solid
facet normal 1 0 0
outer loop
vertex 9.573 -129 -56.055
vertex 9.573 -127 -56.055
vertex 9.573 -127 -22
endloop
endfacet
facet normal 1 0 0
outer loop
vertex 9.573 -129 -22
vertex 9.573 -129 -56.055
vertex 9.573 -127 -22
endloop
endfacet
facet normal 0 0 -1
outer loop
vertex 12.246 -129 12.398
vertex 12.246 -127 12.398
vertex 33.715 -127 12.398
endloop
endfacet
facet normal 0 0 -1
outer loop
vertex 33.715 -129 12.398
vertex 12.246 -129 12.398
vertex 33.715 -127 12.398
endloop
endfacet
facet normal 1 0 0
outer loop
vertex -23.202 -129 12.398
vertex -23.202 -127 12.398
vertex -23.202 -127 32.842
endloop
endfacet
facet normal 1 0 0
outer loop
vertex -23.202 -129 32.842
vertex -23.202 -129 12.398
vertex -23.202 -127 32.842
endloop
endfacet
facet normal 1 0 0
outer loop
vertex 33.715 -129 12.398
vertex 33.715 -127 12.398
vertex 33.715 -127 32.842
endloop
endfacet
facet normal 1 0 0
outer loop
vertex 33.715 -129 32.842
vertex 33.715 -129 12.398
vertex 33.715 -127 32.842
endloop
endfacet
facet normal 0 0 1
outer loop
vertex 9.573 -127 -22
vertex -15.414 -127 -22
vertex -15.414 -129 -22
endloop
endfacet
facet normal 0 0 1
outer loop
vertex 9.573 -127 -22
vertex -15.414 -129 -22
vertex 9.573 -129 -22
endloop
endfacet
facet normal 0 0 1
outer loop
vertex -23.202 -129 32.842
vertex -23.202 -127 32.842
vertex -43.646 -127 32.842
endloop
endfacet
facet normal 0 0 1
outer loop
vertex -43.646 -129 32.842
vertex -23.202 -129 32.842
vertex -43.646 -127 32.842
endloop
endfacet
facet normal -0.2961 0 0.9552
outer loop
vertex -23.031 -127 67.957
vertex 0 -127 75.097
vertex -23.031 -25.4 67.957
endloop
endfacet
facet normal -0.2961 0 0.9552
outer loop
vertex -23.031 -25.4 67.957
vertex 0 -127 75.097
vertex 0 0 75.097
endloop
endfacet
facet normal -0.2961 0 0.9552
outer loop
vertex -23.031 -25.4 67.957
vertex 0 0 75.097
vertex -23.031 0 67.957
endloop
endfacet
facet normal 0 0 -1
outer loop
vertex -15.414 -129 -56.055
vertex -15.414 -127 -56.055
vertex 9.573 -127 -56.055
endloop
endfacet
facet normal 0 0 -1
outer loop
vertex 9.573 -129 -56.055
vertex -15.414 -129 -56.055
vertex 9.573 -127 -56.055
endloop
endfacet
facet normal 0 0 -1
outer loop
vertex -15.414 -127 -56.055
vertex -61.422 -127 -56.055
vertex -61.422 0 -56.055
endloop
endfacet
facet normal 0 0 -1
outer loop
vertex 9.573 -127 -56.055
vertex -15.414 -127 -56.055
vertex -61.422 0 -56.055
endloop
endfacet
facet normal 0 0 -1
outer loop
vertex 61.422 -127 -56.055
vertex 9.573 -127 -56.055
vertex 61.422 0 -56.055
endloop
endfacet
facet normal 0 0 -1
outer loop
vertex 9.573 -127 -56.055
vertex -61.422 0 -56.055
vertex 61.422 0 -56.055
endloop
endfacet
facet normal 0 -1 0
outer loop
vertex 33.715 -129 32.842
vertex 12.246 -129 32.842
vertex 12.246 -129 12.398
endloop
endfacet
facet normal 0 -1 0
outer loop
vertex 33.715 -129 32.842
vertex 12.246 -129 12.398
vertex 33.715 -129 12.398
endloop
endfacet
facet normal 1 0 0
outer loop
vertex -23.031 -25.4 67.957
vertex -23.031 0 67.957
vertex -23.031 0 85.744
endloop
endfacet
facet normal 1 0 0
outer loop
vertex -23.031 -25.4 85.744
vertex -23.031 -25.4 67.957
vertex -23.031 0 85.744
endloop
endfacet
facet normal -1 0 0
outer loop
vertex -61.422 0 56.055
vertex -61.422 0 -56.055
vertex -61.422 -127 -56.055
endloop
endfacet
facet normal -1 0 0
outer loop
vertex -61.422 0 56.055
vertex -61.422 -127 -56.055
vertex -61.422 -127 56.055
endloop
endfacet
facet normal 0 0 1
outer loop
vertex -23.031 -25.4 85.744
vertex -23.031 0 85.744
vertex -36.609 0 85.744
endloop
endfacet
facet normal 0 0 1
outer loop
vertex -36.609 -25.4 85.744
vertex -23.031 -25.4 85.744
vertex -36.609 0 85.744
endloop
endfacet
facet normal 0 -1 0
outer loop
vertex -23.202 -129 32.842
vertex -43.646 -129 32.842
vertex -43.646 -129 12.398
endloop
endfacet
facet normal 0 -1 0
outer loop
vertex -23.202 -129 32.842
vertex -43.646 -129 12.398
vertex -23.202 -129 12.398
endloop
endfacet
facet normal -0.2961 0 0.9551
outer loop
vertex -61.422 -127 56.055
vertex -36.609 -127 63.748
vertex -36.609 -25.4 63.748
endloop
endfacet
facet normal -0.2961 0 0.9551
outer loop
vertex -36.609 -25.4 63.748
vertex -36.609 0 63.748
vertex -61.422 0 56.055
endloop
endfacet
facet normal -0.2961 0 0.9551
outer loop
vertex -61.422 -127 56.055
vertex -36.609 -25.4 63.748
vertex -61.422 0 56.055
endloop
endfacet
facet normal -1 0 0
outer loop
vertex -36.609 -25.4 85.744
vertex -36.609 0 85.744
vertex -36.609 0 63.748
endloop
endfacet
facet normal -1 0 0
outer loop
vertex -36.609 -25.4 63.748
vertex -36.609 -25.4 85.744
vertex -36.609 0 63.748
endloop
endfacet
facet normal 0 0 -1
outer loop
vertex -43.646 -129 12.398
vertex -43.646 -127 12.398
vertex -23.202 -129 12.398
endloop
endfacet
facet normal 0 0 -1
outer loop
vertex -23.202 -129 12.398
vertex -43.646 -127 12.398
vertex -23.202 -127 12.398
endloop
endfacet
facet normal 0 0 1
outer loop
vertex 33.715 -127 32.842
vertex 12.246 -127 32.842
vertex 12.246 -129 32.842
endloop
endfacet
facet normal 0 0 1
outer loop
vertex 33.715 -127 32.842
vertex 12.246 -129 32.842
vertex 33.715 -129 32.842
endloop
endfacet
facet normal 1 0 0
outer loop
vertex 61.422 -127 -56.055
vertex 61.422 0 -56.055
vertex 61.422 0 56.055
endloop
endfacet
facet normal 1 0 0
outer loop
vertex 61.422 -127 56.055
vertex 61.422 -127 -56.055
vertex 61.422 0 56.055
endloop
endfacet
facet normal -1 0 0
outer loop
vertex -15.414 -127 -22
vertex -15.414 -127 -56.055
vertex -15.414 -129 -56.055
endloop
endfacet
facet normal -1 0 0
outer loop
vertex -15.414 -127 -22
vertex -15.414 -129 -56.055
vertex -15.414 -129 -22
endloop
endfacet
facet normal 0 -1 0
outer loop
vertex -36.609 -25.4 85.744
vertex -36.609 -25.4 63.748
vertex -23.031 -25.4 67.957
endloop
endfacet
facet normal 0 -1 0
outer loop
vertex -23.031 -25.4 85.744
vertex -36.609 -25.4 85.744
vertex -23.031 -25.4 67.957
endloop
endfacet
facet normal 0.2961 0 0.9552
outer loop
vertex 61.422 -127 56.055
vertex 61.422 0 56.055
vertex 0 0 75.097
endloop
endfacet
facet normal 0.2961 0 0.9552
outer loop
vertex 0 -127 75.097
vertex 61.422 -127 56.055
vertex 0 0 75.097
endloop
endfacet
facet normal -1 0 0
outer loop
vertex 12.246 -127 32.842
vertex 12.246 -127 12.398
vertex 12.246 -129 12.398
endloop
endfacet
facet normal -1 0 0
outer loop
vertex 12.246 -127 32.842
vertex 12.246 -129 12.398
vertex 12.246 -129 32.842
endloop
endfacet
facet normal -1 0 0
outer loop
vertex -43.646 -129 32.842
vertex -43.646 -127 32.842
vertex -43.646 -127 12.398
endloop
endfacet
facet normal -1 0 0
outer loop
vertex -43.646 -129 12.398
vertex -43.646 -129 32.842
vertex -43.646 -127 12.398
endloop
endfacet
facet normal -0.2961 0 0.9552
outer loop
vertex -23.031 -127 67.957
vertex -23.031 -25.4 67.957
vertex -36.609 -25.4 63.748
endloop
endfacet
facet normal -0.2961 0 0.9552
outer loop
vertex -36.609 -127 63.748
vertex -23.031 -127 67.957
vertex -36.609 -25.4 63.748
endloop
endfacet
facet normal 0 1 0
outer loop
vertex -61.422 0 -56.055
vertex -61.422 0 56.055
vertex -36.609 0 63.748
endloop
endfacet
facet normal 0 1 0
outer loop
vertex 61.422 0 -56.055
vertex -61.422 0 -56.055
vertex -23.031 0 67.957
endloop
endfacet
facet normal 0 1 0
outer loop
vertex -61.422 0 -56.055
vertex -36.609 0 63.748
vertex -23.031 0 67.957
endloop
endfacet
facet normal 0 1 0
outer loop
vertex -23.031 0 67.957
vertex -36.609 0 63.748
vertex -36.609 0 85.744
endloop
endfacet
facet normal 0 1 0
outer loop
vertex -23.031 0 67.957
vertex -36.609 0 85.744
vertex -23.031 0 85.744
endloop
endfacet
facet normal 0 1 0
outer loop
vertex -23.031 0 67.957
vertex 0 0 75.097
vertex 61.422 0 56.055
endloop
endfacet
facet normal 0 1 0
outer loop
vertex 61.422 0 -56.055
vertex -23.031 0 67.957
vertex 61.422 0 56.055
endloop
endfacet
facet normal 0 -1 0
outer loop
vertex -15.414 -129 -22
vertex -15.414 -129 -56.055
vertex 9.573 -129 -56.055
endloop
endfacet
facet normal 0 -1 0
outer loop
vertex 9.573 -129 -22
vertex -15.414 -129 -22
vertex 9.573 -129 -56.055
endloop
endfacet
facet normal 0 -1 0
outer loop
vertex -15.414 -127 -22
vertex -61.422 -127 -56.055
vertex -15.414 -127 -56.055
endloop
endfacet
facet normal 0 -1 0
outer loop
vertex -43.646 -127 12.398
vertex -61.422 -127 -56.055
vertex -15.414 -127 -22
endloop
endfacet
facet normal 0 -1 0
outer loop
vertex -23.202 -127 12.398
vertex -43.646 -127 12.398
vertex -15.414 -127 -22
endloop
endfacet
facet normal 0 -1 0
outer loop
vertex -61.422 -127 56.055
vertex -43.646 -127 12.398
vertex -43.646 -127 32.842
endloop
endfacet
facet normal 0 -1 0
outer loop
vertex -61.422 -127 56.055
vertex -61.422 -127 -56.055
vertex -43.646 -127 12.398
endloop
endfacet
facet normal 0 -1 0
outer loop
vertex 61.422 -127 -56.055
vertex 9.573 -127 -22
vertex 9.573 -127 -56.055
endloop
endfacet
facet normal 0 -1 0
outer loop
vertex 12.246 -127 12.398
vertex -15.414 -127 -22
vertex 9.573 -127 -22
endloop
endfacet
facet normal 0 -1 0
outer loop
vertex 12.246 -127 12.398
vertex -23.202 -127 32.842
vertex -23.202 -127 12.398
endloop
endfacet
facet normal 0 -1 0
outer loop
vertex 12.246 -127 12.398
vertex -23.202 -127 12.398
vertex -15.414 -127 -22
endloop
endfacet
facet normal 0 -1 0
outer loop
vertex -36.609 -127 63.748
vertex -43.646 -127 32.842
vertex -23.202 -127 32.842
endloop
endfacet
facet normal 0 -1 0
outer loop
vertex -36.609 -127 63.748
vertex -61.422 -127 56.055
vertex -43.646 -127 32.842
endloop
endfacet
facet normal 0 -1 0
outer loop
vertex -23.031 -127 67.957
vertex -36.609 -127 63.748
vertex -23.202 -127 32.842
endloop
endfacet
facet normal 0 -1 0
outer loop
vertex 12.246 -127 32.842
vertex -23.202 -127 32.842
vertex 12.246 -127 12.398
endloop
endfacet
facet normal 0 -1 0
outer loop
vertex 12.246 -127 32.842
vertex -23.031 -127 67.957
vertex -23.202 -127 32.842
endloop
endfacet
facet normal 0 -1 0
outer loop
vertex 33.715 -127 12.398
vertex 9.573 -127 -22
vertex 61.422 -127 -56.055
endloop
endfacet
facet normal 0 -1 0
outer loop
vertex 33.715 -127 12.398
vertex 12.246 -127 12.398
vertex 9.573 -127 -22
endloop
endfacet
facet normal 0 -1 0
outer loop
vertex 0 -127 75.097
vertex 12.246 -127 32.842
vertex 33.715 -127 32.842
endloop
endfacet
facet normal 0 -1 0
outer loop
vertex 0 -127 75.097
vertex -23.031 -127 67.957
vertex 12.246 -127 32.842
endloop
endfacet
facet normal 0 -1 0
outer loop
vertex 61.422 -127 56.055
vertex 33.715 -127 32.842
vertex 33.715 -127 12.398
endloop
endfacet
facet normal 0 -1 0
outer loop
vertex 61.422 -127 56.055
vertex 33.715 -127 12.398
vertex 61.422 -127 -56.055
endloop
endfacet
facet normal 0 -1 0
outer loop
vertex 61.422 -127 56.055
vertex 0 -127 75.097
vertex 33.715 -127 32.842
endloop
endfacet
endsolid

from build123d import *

# Parameters (mm, degrees)
F0_W     = 122.8438019753
F0_H     = 112.1096983552
F1_DEPTH = 127
F2_DEPTH = 25.4
F3_W     = 24.9869422987
F3_H     = 34.055031836
F4_DEPTH = 2
F5_W     = 10.221931152
F5_H     = 10.2219306864
F5_W_2   = 21.4697401971
F5_H_2   = 20.4438613728
F6_DEPTH = 2


with BuildPart() as f1:
    # F0 (on Front) → F1 (new body)
    with BuildSketch(Plane.XZ):
        Rectangle(F0_W, F0_H)
        Polygon((-61.4219009876, 56.0548491776), (61.4219009876, 56.0548491776), (0, 75.0973075628), (-23.0313282844, 67.9569699412), (-36.6085842252, 63.7476516512), align=None)
    extrude(amount=F1_DEPTH)

    # F0 (on Front) → F2 (join)
    with BuildSketch(Plane.XZ):
        Polygon((-36.6085842252, 85.7438147068), (-36.6085842252, 63.7476516512), (-23.0313282844, 67.9569699412), (-23.0313282844, 85.7438147068), align=None)
    extrude(amount=F2_DEPTH)

    # F3 (on face) → F4 (join)
    with BuildSketch(Plane.XZ.offset(127)):
        with Locations((-2.9205507599, -39.0273332596)):
            Rectangle(F3_W, F3_H)
    extrude(amount=F4_DEPTH)

    # F5 (on face) → F6 (join)
    with BuildSketch(Plane.XZ.offset(127)):
        with Locations((-38.5350571014, 27.7306872886)):
            Rectangle(F5_W, F5_H)
        with Locations((-28.3131259494, 27.7306872886)):
            Rectangle(F5_W, F5_H)
        with Locations((-38.5350571014, 17.5087566022)):
            Rectangle(F5_W, F5_H)
        with Locations((-28.3131259494, 17.5087566022)):
            Rectangle(F5_W, F5_H)
        with Locations((22.9804925621, 22.6197219454)):
            Rectangle(F5_W_2, F5_H_2)
    extrude(amount=F6_DEPTH)


solid = f1.part
